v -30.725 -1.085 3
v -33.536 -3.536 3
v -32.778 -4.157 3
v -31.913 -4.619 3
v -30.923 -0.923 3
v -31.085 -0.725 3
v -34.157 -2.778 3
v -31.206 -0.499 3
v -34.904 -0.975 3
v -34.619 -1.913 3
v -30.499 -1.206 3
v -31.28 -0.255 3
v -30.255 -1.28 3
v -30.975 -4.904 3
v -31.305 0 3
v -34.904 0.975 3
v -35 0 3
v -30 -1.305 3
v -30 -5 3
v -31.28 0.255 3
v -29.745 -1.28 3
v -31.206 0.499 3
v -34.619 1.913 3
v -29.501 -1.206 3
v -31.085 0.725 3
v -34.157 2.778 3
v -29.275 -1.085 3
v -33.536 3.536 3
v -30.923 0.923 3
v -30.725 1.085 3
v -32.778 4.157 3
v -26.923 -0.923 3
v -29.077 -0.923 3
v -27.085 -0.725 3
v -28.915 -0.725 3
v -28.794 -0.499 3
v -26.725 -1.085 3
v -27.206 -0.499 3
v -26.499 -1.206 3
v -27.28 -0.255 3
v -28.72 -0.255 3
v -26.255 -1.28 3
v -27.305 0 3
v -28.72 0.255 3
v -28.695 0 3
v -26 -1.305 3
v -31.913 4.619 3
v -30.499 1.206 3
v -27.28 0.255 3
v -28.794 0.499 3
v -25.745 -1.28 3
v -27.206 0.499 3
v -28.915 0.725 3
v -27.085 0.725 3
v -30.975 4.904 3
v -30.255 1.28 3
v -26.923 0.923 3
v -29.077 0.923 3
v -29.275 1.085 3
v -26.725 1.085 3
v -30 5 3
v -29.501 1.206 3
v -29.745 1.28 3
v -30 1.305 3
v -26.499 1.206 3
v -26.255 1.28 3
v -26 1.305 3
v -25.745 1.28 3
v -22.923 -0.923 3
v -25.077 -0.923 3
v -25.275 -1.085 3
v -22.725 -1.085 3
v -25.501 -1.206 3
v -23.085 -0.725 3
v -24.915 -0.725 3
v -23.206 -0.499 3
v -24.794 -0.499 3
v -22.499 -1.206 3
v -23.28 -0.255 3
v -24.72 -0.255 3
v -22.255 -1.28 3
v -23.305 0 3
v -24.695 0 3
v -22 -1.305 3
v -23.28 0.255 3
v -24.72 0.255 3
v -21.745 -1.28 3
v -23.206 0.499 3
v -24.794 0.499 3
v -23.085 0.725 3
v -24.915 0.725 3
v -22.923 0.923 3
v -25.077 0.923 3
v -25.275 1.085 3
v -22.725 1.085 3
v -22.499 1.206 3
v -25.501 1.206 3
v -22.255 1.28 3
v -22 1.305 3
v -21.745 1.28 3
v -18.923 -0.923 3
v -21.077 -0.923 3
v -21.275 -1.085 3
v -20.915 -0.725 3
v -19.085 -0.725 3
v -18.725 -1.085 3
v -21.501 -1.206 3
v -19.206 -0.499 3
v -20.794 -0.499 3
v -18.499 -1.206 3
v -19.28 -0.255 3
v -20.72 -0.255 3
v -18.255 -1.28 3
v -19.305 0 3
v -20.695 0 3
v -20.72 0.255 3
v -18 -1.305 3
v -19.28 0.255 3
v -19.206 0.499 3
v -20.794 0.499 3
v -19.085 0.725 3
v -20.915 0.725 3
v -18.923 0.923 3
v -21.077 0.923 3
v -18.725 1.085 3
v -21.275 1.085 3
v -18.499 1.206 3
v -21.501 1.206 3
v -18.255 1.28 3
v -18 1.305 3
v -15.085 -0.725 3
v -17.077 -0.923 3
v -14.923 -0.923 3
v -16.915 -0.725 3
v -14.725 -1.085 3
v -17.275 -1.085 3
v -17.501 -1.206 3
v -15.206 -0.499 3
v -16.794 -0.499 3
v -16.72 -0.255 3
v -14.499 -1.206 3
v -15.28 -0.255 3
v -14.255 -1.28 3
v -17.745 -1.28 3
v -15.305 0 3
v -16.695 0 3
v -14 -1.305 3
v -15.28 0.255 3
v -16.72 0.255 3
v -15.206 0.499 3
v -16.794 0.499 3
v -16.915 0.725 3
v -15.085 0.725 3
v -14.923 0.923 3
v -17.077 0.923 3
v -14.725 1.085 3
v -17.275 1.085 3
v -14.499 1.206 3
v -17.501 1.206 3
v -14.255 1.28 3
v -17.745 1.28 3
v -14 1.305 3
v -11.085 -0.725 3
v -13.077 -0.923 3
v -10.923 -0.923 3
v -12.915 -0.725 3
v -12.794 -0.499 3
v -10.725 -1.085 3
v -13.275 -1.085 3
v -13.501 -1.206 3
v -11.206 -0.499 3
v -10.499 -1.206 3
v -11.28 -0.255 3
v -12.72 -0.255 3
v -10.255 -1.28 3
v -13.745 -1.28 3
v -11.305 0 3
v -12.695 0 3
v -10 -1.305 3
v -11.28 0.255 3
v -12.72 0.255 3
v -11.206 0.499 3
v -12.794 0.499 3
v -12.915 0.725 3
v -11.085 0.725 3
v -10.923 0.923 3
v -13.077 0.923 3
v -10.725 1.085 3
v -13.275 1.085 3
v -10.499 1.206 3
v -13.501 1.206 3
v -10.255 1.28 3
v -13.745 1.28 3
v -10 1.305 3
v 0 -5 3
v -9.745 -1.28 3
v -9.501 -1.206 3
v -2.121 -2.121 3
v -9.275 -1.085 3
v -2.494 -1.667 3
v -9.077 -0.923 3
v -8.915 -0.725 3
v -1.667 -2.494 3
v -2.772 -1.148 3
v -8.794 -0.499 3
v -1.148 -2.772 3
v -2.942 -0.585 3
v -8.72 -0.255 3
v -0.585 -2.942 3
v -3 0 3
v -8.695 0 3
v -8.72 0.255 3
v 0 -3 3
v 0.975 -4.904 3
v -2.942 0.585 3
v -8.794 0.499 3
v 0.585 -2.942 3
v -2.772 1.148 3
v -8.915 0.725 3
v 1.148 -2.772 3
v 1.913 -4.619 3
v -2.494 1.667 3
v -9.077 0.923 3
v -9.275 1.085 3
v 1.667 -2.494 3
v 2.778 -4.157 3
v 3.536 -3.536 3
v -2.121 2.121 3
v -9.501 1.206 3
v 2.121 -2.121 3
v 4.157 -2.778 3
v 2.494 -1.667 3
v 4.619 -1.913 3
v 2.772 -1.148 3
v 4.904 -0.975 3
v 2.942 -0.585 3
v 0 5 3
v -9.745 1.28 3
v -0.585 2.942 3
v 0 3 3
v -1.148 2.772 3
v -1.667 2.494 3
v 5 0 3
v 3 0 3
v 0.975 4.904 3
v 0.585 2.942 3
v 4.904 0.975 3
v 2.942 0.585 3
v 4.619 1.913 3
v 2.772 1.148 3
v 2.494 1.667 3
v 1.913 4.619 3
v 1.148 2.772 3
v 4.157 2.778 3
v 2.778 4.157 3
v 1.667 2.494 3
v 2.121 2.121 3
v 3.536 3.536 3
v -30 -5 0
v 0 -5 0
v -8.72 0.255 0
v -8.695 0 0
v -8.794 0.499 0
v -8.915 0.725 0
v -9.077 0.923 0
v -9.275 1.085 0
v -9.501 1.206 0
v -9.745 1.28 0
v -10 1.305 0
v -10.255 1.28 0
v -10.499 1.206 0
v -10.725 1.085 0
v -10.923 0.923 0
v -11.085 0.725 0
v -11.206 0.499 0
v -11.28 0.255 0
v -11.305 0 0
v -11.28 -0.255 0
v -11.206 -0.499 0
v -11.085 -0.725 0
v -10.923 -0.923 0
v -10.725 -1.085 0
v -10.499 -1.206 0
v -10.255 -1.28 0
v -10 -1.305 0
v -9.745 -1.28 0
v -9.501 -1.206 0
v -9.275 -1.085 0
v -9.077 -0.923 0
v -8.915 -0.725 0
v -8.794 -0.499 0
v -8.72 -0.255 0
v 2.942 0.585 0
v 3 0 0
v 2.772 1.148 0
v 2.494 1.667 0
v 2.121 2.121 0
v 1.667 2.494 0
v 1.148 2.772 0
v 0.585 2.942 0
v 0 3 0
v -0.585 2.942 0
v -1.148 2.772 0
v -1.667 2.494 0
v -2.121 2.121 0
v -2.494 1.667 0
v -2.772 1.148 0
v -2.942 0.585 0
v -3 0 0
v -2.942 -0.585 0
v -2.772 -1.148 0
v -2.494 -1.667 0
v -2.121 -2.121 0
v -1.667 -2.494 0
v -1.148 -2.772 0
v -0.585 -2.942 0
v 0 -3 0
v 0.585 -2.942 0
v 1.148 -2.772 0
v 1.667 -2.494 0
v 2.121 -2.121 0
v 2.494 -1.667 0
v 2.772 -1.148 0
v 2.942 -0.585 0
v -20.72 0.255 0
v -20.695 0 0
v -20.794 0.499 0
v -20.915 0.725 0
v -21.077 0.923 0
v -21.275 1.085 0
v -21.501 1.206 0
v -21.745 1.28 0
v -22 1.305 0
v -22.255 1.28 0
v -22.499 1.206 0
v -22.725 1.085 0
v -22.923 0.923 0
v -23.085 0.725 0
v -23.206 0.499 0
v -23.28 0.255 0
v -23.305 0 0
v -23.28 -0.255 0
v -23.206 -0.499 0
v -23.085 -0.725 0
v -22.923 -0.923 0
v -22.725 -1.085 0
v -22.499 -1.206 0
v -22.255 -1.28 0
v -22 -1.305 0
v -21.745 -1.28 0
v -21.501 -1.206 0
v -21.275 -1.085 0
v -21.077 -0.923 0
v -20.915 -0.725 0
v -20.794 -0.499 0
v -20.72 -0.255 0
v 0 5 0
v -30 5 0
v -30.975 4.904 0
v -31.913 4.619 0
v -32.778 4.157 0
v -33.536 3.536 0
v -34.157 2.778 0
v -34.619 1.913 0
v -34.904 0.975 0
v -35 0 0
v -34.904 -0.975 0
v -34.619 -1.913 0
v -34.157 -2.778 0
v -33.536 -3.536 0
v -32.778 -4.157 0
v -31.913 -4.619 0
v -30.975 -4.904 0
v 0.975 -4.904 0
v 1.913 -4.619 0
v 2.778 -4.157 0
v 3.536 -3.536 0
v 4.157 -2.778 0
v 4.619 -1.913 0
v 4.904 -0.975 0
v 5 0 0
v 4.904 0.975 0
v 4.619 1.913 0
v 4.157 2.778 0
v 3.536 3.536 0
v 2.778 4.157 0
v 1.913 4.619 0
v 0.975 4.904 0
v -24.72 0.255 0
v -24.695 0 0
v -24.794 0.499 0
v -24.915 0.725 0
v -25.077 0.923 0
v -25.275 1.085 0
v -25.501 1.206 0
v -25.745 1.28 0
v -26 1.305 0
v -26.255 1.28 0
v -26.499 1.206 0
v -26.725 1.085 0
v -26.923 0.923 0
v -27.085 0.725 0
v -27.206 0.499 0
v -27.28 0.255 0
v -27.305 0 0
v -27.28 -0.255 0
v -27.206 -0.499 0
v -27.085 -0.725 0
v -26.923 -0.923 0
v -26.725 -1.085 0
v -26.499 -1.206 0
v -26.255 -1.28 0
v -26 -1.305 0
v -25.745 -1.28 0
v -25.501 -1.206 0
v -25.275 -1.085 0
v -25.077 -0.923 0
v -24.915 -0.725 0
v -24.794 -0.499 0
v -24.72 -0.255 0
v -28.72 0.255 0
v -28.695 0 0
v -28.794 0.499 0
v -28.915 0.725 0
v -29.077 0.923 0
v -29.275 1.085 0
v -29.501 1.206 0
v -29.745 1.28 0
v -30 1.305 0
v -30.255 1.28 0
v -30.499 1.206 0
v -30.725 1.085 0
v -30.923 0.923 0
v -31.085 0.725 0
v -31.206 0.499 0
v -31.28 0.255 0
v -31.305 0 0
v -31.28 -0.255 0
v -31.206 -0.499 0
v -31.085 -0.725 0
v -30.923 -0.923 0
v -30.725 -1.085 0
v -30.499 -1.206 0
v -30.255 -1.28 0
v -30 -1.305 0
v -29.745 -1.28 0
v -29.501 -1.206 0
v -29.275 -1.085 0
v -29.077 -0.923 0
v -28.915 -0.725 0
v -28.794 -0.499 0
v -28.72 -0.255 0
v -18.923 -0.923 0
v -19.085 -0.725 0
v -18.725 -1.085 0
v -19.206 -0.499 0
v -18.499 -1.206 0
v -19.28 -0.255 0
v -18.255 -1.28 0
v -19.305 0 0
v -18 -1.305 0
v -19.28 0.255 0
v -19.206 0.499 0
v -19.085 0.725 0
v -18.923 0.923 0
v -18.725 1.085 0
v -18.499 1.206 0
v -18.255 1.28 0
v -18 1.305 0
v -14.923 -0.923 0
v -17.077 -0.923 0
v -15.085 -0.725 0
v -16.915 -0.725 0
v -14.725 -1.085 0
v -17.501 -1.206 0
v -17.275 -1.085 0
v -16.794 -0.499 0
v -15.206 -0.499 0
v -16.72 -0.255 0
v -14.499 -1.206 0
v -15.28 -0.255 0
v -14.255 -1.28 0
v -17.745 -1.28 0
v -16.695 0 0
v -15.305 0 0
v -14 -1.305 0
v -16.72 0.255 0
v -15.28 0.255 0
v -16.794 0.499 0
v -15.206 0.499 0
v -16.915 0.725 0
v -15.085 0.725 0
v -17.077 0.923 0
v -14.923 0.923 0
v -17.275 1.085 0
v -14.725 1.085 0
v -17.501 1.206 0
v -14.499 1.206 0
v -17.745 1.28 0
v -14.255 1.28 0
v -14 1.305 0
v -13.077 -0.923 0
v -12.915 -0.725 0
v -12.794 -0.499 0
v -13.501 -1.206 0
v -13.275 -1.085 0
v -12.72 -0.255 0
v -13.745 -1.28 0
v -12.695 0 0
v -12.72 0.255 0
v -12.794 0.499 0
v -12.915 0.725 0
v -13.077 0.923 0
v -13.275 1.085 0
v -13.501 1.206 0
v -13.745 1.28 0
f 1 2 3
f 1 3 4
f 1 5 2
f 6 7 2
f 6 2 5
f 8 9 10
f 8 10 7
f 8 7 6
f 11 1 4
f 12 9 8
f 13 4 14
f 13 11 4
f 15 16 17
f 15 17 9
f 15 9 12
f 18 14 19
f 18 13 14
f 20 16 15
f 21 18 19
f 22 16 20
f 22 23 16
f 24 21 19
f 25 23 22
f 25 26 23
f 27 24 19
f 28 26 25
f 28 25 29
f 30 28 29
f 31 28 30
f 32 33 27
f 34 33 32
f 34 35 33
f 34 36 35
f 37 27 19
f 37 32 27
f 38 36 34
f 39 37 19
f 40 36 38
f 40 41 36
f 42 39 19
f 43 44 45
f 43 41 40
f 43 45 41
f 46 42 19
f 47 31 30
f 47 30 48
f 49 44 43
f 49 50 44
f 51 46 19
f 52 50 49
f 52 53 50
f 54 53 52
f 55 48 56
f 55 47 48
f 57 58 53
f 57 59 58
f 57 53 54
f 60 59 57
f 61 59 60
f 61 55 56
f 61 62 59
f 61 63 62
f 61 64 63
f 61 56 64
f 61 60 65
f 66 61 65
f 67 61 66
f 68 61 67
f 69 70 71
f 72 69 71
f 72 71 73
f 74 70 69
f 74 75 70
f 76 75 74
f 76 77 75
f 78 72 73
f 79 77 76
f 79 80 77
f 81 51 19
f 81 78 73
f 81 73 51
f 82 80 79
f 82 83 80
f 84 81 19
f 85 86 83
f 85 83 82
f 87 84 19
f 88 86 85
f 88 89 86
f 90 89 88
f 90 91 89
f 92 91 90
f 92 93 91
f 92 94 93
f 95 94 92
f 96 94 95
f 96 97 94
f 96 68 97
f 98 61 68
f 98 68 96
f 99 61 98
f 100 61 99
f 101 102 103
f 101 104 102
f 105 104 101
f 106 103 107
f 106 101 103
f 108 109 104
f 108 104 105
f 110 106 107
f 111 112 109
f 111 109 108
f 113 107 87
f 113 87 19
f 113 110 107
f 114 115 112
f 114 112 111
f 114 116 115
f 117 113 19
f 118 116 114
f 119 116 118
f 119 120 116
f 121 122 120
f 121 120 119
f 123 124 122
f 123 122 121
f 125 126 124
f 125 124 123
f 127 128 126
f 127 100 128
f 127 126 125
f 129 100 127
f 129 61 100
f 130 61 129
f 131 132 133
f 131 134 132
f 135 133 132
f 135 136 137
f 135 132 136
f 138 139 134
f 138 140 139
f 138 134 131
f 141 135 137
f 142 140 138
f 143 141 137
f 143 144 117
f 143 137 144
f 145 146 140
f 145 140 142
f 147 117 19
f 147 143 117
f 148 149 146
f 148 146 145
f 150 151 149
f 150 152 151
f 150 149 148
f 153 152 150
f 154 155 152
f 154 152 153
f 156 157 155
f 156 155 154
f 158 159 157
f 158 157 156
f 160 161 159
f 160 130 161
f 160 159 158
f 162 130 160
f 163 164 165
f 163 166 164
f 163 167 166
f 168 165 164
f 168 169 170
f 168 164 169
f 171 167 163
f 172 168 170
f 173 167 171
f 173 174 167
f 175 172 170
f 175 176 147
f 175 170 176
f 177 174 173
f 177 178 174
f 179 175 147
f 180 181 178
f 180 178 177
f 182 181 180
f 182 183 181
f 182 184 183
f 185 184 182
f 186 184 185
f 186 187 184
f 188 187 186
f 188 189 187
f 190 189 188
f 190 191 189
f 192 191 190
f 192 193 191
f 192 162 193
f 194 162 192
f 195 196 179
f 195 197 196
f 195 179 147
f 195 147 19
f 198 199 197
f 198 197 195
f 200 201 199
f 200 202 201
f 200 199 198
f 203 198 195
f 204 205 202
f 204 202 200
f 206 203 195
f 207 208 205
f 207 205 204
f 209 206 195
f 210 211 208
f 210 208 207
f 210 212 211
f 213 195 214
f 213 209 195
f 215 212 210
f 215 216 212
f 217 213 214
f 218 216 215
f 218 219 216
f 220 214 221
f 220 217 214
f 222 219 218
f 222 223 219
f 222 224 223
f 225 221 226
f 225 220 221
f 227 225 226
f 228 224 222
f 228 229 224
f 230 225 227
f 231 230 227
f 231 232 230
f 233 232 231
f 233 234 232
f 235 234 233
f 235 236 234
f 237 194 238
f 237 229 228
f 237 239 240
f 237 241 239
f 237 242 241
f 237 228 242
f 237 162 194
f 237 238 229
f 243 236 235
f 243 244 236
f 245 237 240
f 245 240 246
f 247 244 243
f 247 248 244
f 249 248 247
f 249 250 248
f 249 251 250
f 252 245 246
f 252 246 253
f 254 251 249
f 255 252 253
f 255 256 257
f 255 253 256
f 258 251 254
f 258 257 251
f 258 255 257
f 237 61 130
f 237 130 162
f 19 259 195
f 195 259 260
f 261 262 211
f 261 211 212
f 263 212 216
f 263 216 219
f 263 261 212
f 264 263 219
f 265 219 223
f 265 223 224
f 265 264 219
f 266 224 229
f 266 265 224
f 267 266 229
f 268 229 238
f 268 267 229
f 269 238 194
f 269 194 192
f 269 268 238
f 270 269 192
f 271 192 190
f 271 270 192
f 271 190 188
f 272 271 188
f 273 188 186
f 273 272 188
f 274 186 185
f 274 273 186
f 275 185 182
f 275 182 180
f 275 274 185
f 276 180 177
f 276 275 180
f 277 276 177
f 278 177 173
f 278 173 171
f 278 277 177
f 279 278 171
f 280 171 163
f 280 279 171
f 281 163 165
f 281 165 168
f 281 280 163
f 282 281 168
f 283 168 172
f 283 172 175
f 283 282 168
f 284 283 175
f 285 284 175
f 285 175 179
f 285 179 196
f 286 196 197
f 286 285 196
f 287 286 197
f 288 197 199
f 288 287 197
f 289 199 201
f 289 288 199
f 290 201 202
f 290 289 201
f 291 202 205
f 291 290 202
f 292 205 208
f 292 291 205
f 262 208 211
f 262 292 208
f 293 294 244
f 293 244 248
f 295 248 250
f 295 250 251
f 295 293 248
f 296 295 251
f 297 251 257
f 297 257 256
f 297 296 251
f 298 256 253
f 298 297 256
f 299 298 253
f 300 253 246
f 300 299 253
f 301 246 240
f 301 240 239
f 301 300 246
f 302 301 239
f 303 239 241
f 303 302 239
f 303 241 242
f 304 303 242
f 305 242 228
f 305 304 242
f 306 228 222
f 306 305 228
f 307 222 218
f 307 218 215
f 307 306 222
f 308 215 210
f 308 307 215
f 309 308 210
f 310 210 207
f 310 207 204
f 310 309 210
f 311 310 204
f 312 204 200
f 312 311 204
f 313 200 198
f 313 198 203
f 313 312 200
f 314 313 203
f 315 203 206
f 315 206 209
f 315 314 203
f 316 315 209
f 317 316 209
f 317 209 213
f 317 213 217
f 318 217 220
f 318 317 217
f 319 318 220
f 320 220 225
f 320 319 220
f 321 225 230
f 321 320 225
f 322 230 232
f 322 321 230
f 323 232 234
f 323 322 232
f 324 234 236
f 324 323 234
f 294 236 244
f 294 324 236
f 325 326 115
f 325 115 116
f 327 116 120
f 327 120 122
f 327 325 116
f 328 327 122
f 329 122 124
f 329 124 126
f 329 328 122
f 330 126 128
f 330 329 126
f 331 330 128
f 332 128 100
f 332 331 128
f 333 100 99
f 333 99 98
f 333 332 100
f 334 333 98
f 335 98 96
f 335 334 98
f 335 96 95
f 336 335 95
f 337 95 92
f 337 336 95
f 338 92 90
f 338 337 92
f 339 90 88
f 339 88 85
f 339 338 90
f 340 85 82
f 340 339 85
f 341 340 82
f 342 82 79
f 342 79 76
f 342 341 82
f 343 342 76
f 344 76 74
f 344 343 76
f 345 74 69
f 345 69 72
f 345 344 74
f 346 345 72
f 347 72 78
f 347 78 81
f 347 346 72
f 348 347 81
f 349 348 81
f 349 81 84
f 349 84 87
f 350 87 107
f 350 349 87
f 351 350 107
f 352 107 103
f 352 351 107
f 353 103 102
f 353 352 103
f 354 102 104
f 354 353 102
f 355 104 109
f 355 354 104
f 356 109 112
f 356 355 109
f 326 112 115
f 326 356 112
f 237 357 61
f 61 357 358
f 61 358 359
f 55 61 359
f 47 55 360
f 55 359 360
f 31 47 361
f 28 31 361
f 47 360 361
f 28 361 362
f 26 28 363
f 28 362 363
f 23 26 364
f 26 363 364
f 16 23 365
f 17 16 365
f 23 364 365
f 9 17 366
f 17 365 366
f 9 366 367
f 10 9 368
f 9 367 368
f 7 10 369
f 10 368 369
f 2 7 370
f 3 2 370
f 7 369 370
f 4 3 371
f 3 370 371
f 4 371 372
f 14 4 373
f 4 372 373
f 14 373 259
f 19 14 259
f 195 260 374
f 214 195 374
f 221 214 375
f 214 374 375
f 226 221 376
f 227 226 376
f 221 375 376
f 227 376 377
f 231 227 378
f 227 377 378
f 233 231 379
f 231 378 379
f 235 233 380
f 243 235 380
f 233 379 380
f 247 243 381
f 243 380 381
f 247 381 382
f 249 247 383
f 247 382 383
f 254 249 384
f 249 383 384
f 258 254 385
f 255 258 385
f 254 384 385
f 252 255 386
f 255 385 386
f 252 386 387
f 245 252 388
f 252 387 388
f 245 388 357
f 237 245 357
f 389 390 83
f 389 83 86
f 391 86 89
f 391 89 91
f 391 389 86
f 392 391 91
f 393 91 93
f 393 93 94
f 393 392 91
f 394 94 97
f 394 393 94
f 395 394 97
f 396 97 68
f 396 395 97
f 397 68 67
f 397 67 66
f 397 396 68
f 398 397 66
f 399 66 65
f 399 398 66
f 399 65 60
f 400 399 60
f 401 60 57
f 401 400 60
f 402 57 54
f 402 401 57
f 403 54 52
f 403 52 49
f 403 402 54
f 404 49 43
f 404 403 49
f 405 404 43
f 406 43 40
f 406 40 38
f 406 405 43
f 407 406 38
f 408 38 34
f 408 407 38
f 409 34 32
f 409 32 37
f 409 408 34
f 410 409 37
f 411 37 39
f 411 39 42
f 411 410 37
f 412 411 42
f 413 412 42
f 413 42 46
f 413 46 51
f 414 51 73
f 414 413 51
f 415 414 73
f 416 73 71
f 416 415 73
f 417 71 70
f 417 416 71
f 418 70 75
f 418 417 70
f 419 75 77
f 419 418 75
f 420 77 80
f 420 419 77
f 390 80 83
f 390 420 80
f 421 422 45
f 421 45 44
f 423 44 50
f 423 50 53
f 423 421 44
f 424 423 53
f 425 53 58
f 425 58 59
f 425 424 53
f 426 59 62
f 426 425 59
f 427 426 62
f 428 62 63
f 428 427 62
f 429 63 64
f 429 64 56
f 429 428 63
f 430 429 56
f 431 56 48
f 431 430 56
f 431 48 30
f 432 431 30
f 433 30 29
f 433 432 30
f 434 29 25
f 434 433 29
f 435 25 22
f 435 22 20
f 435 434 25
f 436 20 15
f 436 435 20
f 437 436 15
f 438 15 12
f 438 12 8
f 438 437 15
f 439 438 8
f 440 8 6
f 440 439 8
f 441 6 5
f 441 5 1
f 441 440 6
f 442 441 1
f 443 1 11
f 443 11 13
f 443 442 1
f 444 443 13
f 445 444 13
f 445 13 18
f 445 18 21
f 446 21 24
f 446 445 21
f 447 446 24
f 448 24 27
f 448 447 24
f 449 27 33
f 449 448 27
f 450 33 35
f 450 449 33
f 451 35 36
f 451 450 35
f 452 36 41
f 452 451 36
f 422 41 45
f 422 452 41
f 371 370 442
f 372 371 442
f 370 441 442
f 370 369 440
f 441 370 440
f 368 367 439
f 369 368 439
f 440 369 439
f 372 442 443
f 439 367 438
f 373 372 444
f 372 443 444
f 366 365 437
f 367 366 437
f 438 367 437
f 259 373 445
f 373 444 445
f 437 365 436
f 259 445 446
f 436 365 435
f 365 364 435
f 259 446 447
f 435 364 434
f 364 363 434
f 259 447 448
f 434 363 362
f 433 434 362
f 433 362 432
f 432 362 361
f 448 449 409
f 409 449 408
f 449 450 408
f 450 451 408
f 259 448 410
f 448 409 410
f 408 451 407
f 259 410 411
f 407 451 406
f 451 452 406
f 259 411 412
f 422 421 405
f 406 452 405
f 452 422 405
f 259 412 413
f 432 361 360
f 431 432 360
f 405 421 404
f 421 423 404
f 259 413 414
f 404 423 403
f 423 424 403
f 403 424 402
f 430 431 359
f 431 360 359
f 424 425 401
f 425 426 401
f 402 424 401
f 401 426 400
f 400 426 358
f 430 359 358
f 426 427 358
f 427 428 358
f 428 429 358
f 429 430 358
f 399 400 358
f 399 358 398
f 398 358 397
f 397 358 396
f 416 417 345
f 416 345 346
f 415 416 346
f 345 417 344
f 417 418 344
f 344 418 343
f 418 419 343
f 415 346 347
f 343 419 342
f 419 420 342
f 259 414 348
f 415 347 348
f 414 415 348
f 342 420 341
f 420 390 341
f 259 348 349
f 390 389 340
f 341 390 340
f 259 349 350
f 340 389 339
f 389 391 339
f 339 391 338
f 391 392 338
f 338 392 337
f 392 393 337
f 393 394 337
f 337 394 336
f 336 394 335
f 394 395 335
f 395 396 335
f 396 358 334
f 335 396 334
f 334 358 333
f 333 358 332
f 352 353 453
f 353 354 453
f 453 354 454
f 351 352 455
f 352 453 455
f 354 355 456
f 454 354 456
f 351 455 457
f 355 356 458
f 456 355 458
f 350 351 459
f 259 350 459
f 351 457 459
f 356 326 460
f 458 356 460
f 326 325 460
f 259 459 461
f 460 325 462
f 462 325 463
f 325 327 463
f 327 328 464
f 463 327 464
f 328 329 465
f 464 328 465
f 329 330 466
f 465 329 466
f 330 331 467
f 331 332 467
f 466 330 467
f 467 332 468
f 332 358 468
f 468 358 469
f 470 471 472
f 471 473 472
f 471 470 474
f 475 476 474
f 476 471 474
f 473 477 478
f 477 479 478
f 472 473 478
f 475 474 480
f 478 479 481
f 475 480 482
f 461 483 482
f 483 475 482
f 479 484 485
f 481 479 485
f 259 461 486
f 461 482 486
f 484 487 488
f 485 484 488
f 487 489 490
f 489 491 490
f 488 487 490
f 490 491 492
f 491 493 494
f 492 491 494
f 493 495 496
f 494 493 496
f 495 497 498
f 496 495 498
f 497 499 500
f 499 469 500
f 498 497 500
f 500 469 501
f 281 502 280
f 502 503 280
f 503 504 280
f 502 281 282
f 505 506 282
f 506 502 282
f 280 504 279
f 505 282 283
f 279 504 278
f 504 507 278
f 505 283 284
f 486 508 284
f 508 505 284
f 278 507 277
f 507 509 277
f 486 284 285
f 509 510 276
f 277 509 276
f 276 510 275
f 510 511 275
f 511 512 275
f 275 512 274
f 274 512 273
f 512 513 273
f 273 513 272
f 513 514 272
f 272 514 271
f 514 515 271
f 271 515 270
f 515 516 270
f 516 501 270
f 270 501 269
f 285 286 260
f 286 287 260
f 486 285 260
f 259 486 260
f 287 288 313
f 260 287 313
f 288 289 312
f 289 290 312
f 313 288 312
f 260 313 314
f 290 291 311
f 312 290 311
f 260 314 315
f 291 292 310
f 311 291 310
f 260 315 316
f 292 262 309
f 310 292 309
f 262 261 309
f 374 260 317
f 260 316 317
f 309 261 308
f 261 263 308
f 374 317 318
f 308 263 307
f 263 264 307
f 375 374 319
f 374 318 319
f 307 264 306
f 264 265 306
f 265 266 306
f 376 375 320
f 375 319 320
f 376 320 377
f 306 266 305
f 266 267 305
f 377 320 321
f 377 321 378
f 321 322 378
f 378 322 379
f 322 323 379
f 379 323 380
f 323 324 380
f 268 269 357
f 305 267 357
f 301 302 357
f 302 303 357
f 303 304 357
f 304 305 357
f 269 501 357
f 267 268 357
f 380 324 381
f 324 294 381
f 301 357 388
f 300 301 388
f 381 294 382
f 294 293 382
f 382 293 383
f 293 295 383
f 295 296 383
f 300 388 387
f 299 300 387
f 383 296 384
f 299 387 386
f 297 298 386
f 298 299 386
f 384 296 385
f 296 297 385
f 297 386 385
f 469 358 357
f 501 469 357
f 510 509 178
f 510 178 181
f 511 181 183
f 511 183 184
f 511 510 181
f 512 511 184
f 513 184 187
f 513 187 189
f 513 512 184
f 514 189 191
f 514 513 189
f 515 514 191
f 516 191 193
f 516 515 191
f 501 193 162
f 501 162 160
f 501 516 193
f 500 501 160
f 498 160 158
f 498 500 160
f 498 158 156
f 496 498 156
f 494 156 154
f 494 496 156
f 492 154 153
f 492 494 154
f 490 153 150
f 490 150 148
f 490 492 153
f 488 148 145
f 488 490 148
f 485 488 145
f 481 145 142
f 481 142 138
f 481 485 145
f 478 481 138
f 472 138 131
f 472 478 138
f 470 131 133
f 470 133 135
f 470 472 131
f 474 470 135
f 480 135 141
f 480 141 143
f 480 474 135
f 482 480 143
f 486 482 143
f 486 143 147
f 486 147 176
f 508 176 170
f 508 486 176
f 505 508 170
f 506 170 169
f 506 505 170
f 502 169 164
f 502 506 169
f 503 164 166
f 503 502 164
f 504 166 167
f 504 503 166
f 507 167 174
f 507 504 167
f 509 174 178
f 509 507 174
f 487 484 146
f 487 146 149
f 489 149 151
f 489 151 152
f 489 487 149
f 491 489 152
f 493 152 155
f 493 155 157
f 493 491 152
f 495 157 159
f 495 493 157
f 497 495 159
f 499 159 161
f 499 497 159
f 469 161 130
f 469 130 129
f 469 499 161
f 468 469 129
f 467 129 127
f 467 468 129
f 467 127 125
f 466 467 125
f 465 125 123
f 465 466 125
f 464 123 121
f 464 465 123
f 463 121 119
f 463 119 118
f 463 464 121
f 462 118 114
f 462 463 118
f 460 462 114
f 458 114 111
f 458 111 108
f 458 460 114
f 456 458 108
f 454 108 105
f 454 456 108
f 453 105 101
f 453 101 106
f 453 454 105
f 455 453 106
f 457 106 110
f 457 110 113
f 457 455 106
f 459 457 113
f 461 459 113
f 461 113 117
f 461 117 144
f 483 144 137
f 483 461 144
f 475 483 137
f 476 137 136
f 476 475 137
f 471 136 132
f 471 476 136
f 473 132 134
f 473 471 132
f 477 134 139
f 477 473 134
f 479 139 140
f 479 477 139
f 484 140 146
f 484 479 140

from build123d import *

# Parameters (mm, degrees)
ESQUISSE1_R        = 1.305103473
ESQUISSE1_R_2      = 3
BOSS_EXTRU_1_DEPTH = 3


with BuildPart() as part:
    # Esquisse1 → Boss.-Extru.1 (new body)
    with BuildSketch(Plane.XY):
        with BuildLine():
            Line((-30, -5), (0, -5))
            ThreePointArc((0, -5), (5, 0), (0, 5))
            Line((0, 5), (-30, 5))
            ThreePointArc((-30, 5), (-35, 0), (-30, -5))
        make_face()
        with Locations((-30, 0)):
            Circle(ESQUISSE1_R, mode=Mode.SUBTRACT)
        with Locations((-26, 0)):
            Circle(ESQUISSE1_R, mode=Mode.SUBTRACT)
        with Locations((-22, 0)):
            Circle(ESQUISSE1_R, mode=Mode.SUBTRACT)
        with Locations((-18, 0)):
            Circle(ESQUISSE1_R, mode=Mode.SUBTRACT)
        with Locations((-14, 0)):
            Circle(ESQUISSE1_R, mode=Mode.SUBTRACT)
        with Locations((-10, 0)):
            Circle(ESQUISSE1_R, mode=Mode.SUBTRACT)
        Circle(ESQUISSE1_R_2, mode=Mode.SUBTRACT)
    extrude(amount=BOSS_EXTRU_1_DEPTH)


solid = part.part
